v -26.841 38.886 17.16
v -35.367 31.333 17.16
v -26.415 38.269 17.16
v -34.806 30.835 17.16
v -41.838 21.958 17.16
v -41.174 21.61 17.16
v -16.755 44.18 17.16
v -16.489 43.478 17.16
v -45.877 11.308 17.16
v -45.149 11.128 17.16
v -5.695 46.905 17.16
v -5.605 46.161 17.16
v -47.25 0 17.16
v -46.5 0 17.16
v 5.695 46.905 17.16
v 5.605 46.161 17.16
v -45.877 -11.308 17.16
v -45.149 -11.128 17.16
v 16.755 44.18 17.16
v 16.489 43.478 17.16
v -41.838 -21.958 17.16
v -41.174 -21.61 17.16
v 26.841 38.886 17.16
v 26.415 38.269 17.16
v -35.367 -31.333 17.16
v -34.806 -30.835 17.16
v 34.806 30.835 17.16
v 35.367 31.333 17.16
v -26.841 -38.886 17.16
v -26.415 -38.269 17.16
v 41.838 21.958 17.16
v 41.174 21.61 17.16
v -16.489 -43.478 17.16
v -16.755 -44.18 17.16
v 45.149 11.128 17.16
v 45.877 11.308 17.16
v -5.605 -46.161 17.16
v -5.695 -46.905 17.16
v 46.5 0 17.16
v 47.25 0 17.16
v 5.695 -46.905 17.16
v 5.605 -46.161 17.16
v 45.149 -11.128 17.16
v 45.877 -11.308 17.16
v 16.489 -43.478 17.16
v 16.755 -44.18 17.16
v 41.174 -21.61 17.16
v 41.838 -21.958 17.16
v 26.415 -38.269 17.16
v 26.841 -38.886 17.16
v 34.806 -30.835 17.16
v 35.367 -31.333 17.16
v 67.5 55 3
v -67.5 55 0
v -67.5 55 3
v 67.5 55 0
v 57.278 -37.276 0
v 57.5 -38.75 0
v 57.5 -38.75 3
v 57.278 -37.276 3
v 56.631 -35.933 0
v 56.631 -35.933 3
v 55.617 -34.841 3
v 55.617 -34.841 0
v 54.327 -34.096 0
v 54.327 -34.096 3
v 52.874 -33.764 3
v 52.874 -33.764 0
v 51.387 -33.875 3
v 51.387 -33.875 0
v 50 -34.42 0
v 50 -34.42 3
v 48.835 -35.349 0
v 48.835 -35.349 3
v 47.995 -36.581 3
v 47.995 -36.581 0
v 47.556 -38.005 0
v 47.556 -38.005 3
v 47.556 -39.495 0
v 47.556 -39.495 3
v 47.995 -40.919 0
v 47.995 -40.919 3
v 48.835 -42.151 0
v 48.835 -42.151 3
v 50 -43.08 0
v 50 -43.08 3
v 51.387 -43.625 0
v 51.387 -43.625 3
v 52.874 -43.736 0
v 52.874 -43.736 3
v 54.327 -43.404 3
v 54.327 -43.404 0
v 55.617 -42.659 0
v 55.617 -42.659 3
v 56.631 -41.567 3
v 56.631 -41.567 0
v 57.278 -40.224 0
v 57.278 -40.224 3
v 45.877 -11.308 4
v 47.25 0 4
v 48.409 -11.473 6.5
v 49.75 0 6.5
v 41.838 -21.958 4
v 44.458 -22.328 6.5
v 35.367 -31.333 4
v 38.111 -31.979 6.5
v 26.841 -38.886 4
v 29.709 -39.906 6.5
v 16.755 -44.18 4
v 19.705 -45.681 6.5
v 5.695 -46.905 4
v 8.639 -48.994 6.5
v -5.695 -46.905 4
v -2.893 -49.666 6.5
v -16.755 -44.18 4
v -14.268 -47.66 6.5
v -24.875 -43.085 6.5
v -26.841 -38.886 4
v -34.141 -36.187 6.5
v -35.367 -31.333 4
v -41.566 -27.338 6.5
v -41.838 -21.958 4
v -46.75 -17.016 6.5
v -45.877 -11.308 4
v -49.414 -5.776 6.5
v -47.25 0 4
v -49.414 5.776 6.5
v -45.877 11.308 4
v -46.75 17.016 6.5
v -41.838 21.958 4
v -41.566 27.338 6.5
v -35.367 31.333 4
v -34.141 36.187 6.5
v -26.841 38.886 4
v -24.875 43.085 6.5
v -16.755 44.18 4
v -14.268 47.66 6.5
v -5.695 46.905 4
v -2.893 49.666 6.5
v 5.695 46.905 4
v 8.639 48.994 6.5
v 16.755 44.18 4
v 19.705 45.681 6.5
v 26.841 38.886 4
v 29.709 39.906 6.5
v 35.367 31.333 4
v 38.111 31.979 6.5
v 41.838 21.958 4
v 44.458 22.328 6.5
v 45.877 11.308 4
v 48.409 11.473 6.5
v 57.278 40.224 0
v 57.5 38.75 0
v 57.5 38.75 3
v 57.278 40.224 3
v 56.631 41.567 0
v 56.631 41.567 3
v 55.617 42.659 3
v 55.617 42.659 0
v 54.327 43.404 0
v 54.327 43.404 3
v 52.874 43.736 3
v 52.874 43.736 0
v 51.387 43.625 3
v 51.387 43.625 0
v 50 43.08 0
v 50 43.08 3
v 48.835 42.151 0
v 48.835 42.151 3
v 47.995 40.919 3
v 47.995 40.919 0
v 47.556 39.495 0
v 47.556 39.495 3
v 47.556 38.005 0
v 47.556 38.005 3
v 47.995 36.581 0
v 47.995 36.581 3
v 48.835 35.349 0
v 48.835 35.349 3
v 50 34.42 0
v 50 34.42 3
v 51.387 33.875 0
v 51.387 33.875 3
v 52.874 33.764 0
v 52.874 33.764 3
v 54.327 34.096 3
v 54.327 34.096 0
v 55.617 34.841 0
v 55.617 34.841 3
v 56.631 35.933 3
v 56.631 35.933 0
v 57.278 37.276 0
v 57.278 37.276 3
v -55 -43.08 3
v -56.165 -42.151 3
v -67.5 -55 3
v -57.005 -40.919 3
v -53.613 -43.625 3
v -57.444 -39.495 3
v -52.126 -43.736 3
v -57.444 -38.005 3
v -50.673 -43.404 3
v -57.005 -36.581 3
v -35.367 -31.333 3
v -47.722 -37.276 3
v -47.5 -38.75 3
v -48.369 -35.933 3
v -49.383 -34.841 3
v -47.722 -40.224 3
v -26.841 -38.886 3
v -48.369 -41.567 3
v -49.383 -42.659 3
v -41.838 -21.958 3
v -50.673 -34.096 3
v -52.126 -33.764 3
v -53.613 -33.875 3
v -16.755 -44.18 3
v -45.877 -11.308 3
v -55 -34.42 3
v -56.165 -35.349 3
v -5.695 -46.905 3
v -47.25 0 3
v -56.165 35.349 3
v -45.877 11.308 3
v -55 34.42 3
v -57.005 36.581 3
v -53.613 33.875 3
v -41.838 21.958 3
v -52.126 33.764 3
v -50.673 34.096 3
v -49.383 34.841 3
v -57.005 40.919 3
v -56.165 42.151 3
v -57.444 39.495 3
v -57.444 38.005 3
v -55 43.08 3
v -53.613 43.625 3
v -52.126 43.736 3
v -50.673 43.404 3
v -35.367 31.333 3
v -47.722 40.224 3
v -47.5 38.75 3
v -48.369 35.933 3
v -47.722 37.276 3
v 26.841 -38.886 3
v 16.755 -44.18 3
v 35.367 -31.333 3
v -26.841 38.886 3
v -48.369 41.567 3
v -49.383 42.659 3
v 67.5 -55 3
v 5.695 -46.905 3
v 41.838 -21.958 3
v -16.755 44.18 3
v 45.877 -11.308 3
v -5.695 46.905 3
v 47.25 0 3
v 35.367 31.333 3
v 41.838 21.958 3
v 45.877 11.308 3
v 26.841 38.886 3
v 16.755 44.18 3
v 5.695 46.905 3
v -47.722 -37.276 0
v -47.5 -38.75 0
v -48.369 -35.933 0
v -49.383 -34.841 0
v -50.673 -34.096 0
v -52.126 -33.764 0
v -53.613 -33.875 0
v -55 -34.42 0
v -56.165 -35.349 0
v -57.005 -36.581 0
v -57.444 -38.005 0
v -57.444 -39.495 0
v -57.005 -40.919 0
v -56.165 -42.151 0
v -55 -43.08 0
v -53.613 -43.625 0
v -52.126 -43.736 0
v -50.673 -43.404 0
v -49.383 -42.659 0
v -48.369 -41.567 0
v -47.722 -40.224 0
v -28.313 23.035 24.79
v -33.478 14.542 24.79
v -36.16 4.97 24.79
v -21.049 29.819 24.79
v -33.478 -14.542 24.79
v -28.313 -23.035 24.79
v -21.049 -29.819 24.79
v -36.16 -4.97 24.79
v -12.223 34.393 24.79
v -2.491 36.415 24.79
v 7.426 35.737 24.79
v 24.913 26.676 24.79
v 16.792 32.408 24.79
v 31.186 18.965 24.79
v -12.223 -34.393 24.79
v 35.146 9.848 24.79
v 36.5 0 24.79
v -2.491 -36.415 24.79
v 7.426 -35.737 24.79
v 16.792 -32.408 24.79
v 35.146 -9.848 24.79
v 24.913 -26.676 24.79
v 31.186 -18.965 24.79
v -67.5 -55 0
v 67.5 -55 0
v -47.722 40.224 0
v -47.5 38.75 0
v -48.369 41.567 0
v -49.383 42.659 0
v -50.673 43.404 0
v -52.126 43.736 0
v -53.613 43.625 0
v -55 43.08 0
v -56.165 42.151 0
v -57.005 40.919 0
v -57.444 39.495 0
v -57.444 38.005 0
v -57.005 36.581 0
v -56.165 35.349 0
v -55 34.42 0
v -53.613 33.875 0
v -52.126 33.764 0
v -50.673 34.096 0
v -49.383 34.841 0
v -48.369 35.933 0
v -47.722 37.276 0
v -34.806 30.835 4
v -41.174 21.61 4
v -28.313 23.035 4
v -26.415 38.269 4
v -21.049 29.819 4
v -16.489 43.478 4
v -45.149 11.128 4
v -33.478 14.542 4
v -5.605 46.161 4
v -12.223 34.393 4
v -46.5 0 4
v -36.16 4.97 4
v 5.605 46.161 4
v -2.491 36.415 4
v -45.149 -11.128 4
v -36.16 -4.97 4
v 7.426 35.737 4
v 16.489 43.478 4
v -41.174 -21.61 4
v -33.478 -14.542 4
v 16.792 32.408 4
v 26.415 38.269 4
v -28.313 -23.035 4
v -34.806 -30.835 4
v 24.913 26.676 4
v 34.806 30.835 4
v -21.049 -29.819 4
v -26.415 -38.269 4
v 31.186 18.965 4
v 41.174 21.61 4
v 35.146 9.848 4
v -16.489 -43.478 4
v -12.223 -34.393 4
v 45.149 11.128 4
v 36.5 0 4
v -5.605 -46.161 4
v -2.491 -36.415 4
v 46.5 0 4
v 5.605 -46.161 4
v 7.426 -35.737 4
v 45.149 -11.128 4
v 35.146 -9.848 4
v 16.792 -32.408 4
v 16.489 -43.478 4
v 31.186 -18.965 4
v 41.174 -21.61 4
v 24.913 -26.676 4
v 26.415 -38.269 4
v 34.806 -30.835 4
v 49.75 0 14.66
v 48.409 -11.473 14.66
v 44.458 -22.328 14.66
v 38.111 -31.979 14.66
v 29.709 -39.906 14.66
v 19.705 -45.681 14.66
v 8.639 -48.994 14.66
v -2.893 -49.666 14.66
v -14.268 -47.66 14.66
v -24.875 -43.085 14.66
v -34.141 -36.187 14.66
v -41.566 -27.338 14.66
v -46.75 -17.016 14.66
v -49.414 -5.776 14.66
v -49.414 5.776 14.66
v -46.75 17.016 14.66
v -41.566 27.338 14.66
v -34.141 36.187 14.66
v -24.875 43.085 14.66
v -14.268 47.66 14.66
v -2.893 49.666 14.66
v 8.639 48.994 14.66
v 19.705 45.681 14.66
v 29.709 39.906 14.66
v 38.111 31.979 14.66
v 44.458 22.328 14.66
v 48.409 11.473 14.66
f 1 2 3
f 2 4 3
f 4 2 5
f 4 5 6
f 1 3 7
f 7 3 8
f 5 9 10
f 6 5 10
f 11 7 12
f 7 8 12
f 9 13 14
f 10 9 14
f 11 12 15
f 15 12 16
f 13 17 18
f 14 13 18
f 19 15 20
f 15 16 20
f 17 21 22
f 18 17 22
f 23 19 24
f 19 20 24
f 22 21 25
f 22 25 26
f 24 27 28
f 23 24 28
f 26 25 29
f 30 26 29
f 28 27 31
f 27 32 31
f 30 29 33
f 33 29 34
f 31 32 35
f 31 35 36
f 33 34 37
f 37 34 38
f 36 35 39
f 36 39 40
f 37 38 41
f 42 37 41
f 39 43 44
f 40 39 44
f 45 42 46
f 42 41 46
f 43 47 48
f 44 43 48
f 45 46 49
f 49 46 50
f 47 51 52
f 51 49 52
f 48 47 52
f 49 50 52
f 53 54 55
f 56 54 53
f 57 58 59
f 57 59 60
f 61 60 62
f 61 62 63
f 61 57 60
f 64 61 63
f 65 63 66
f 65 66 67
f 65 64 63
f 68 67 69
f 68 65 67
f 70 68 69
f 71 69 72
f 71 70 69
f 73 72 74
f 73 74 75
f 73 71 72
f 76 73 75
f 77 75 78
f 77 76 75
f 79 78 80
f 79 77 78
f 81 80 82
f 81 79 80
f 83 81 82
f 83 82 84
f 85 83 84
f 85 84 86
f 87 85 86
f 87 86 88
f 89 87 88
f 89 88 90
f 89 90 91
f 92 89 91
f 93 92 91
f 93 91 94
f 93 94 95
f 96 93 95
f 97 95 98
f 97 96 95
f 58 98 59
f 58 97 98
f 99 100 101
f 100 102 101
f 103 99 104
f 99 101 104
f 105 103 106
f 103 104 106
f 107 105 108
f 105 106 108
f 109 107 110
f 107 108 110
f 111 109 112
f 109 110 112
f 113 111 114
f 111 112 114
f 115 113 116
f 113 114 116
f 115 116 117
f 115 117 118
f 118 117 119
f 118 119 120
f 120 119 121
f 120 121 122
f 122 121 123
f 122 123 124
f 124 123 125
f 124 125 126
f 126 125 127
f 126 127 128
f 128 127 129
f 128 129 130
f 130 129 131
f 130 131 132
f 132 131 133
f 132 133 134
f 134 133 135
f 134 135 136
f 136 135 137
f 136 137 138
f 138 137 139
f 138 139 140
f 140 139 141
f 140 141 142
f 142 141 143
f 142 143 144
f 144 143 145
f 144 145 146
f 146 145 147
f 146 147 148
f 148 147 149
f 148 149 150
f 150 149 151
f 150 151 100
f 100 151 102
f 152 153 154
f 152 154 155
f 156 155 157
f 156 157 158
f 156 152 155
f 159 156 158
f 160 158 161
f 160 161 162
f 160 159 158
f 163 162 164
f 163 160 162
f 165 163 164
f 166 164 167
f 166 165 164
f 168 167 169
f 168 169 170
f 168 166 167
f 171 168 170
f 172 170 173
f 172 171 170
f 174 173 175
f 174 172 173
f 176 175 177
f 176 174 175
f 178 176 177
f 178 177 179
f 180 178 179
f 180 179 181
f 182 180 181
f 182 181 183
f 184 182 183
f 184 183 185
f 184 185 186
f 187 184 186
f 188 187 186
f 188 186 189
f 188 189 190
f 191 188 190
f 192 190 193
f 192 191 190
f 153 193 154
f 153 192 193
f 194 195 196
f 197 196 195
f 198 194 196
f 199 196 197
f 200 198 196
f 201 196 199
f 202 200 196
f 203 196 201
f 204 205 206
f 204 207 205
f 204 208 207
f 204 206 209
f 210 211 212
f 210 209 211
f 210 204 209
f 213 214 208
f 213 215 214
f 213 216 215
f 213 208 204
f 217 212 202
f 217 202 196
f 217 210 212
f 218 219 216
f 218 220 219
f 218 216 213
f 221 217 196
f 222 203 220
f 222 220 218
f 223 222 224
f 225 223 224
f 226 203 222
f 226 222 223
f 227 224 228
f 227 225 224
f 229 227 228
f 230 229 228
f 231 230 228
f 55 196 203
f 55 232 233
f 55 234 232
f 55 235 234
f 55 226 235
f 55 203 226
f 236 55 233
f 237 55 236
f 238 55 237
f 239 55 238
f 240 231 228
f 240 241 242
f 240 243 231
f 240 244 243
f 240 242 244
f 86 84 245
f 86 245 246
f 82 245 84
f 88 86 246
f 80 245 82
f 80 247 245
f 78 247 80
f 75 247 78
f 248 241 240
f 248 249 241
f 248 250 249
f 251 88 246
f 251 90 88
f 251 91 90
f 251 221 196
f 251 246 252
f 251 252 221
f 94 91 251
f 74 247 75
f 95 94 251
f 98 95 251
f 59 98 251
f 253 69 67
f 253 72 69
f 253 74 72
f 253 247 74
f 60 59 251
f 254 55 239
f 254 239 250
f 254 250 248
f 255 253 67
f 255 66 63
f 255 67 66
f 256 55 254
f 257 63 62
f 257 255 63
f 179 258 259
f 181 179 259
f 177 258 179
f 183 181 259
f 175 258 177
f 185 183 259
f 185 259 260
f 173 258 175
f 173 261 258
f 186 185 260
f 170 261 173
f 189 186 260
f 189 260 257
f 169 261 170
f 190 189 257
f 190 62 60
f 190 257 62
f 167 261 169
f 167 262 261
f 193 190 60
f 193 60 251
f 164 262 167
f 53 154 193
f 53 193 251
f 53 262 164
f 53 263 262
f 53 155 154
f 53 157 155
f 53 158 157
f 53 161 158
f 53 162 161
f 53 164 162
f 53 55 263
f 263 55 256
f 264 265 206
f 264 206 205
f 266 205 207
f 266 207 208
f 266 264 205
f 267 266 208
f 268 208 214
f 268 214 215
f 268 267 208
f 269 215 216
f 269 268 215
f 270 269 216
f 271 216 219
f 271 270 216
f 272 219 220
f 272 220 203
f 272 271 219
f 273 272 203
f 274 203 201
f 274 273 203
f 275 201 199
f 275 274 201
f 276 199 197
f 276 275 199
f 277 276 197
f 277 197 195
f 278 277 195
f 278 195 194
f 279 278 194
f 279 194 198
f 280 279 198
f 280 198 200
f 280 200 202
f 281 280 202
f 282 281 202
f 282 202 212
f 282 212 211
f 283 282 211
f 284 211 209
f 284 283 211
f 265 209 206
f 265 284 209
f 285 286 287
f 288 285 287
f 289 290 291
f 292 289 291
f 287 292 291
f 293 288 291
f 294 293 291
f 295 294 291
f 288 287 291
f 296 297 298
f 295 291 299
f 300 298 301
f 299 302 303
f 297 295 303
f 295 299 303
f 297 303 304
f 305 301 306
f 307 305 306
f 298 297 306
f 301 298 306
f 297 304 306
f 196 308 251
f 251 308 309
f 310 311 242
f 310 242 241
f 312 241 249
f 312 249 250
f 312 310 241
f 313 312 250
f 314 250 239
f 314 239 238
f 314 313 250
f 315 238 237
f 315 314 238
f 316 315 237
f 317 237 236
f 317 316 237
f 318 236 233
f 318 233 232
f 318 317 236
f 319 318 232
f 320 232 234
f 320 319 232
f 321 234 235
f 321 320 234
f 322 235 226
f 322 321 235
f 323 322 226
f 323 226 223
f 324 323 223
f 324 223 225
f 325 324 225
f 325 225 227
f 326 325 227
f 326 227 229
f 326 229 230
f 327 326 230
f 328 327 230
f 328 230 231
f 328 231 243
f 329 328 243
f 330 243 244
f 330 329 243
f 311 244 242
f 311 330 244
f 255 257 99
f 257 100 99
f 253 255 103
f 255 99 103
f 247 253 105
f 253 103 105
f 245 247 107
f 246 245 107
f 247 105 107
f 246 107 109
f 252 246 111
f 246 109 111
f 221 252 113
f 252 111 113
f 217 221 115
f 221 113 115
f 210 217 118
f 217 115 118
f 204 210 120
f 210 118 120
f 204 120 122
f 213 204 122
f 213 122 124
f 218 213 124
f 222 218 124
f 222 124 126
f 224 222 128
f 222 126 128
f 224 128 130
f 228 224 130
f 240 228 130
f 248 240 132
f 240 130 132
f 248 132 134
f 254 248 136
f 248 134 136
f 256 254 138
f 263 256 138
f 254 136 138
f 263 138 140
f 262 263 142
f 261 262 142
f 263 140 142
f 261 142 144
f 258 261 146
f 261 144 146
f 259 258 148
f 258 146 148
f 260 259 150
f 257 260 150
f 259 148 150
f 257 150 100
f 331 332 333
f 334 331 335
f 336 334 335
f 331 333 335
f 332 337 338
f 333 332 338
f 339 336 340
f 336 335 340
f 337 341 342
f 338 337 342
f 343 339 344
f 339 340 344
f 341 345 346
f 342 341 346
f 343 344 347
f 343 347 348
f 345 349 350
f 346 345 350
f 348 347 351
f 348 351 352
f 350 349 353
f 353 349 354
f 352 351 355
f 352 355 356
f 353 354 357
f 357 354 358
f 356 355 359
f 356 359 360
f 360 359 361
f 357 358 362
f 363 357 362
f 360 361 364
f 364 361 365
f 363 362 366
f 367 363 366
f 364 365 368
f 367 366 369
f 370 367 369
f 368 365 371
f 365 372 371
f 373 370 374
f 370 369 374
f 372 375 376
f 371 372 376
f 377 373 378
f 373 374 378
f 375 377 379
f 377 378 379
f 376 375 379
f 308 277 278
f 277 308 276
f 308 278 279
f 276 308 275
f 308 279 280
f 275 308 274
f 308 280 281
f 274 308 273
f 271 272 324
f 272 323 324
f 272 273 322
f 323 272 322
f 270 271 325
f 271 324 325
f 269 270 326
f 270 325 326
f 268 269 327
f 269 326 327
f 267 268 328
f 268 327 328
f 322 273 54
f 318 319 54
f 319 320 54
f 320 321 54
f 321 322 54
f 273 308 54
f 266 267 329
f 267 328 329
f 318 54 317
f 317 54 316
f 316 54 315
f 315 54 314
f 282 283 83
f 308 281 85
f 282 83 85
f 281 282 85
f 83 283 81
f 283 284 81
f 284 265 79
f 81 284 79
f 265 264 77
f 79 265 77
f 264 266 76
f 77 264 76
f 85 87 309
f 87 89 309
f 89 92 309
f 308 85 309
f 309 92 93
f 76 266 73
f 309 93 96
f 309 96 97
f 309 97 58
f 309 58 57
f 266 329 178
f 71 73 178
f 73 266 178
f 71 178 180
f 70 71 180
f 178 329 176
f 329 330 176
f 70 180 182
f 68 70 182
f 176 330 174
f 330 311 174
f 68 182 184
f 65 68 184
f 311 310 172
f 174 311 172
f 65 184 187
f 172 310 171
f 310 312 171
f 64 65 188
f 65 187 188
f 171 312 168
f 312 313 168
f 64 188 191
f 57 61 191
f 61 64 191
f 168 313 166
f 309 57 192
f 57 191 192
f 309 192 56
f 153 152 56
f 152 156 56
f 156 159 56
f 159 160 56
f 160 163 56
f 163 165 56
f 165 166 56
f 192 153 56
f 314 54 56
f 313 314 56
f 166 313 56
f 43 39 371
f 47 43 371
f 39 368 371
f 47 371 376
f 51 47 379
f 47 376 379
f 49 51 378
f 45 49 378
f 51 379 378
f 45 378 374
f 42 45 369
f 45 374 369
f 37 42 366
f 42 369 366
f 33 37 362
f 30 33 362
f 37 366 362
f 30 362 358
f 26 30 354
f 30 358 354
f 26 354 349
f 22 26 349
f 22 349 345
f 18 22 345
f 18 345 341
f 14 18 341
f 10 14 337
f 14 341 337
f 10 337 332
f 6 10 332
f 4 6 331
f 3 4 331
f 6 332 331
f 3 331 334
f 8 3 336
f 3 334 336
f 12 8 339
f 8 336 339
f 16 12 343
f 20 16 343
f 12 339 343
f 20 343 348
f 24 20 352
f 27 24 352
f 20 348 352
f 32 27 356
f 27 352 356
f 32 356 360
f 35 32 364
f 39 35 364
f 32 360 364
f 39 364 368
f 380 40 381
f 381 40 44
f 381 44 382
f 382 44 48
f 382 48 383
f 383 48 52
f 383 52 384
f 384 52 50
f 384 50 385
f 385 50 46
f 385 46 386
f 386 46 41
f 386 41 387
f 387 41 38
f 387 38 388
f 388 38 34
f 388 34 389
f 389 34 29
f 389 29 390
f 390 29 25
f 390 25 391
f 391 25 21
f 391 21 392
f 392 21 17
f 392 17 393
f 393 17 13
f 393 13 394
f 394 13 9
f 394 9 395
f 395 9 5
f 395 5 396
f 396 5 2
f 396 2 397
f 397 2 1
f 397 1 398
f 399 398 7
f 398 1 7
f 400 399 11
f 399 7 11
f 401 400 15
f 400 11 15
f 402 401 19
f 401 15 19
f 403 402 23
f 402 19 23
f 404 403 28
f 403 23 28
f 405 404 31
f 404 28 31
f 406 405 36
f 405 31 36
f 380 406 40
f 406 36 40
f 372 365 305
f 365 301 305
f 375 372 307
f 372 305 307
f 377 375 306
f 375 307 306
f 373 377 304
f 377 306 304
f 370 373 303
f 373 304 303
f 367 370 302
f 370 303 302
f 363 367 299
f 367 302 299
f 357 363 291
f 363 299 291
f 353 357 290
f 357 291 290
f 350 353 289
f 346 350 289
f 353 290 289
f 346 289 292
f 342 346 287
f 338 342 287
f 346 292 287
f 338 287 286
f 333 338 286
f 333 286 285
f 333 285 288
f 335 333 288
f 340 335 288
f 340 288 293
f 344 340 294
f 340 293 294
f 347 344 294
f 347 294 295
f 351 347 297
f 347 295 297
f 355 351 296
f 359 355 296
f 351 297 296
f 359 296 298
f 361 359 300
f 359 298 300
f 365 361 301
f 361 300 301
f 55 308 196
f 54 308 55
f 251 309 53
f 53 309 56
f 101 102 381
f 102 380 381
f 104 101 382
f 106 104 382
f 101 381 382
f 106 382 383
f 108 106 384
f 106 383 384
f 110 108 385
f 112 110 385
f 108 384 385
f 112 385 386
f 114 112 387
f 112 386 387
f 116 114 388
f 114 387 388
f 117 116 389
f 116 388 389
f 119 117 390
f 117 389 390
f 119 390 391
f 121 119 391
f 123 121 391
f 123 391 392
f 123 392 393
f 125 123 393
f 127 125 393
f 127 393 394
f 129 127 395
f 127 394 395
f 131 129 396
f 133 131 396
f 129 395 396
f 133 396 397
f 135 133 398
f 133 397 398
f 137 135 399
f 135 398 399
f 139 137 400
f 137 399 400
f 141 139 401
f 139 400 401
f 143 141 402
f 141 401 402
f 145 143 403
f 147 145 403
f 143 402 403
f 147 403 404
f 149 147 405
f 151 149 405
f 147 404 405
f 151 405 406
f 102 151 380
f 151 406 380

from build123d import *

# Parameters (mm, degrees)
SCHIZZO1_W                   = 135
SCHIZZO1_H                   = 110
SCHIZZO1_R                   = 5
ESTRUSIONE_ESTRUSIONE1_DEPTH = 3


with BuildPart() as part:
    # Schizzo1 → Estrusione-Estrusione1 (new body)
    with BuildSketch(Plane.XY):
        Rectangle(SCHIZZO1_W, SCHIZZO1_H)
        with Locations((-52.5, 38.75)):
            Circle(SCHIZZO1_R, mode=Mode.SUBTRACT)
        with Locations((-52.5, -38.75)):
            Circle(SCHIZZO1_R, mode=Mode.SUBTRACT)
        with Locations((52.5, -38.75)):
            Circle(SCHIZZO1_R, mode=Mode.SUBTRACT)
        with Locations((52.5, 38.75)):
            Circle(SCHIZZO1_R, mode=Mode.SUBTRACT)
    extrude(amount=ESTRUSIONE_ESTRUSIONE1_DEPTH)

    # Schizzo3 → Rivoluzione1 (revolve)
    with BuildSketch(Plane(origin=(0, 0, 0), x_dir=(1, 0, 0), z_dir=(0, 1, 0))):
        Polygon((47.25, -4), (49.75, -6.5), (49.75, -14.66), (47.25, -17.16), (46.5, -17.16), (46.5, -4), (36.5, -4), (36.5, -24.79), (0, -24.79), (0, -4), (0, -3), (47.25, -3), align=None)
    revolve(axis=Axis((0, 0, 4), (0, 0, -1)))


solid = part.part
